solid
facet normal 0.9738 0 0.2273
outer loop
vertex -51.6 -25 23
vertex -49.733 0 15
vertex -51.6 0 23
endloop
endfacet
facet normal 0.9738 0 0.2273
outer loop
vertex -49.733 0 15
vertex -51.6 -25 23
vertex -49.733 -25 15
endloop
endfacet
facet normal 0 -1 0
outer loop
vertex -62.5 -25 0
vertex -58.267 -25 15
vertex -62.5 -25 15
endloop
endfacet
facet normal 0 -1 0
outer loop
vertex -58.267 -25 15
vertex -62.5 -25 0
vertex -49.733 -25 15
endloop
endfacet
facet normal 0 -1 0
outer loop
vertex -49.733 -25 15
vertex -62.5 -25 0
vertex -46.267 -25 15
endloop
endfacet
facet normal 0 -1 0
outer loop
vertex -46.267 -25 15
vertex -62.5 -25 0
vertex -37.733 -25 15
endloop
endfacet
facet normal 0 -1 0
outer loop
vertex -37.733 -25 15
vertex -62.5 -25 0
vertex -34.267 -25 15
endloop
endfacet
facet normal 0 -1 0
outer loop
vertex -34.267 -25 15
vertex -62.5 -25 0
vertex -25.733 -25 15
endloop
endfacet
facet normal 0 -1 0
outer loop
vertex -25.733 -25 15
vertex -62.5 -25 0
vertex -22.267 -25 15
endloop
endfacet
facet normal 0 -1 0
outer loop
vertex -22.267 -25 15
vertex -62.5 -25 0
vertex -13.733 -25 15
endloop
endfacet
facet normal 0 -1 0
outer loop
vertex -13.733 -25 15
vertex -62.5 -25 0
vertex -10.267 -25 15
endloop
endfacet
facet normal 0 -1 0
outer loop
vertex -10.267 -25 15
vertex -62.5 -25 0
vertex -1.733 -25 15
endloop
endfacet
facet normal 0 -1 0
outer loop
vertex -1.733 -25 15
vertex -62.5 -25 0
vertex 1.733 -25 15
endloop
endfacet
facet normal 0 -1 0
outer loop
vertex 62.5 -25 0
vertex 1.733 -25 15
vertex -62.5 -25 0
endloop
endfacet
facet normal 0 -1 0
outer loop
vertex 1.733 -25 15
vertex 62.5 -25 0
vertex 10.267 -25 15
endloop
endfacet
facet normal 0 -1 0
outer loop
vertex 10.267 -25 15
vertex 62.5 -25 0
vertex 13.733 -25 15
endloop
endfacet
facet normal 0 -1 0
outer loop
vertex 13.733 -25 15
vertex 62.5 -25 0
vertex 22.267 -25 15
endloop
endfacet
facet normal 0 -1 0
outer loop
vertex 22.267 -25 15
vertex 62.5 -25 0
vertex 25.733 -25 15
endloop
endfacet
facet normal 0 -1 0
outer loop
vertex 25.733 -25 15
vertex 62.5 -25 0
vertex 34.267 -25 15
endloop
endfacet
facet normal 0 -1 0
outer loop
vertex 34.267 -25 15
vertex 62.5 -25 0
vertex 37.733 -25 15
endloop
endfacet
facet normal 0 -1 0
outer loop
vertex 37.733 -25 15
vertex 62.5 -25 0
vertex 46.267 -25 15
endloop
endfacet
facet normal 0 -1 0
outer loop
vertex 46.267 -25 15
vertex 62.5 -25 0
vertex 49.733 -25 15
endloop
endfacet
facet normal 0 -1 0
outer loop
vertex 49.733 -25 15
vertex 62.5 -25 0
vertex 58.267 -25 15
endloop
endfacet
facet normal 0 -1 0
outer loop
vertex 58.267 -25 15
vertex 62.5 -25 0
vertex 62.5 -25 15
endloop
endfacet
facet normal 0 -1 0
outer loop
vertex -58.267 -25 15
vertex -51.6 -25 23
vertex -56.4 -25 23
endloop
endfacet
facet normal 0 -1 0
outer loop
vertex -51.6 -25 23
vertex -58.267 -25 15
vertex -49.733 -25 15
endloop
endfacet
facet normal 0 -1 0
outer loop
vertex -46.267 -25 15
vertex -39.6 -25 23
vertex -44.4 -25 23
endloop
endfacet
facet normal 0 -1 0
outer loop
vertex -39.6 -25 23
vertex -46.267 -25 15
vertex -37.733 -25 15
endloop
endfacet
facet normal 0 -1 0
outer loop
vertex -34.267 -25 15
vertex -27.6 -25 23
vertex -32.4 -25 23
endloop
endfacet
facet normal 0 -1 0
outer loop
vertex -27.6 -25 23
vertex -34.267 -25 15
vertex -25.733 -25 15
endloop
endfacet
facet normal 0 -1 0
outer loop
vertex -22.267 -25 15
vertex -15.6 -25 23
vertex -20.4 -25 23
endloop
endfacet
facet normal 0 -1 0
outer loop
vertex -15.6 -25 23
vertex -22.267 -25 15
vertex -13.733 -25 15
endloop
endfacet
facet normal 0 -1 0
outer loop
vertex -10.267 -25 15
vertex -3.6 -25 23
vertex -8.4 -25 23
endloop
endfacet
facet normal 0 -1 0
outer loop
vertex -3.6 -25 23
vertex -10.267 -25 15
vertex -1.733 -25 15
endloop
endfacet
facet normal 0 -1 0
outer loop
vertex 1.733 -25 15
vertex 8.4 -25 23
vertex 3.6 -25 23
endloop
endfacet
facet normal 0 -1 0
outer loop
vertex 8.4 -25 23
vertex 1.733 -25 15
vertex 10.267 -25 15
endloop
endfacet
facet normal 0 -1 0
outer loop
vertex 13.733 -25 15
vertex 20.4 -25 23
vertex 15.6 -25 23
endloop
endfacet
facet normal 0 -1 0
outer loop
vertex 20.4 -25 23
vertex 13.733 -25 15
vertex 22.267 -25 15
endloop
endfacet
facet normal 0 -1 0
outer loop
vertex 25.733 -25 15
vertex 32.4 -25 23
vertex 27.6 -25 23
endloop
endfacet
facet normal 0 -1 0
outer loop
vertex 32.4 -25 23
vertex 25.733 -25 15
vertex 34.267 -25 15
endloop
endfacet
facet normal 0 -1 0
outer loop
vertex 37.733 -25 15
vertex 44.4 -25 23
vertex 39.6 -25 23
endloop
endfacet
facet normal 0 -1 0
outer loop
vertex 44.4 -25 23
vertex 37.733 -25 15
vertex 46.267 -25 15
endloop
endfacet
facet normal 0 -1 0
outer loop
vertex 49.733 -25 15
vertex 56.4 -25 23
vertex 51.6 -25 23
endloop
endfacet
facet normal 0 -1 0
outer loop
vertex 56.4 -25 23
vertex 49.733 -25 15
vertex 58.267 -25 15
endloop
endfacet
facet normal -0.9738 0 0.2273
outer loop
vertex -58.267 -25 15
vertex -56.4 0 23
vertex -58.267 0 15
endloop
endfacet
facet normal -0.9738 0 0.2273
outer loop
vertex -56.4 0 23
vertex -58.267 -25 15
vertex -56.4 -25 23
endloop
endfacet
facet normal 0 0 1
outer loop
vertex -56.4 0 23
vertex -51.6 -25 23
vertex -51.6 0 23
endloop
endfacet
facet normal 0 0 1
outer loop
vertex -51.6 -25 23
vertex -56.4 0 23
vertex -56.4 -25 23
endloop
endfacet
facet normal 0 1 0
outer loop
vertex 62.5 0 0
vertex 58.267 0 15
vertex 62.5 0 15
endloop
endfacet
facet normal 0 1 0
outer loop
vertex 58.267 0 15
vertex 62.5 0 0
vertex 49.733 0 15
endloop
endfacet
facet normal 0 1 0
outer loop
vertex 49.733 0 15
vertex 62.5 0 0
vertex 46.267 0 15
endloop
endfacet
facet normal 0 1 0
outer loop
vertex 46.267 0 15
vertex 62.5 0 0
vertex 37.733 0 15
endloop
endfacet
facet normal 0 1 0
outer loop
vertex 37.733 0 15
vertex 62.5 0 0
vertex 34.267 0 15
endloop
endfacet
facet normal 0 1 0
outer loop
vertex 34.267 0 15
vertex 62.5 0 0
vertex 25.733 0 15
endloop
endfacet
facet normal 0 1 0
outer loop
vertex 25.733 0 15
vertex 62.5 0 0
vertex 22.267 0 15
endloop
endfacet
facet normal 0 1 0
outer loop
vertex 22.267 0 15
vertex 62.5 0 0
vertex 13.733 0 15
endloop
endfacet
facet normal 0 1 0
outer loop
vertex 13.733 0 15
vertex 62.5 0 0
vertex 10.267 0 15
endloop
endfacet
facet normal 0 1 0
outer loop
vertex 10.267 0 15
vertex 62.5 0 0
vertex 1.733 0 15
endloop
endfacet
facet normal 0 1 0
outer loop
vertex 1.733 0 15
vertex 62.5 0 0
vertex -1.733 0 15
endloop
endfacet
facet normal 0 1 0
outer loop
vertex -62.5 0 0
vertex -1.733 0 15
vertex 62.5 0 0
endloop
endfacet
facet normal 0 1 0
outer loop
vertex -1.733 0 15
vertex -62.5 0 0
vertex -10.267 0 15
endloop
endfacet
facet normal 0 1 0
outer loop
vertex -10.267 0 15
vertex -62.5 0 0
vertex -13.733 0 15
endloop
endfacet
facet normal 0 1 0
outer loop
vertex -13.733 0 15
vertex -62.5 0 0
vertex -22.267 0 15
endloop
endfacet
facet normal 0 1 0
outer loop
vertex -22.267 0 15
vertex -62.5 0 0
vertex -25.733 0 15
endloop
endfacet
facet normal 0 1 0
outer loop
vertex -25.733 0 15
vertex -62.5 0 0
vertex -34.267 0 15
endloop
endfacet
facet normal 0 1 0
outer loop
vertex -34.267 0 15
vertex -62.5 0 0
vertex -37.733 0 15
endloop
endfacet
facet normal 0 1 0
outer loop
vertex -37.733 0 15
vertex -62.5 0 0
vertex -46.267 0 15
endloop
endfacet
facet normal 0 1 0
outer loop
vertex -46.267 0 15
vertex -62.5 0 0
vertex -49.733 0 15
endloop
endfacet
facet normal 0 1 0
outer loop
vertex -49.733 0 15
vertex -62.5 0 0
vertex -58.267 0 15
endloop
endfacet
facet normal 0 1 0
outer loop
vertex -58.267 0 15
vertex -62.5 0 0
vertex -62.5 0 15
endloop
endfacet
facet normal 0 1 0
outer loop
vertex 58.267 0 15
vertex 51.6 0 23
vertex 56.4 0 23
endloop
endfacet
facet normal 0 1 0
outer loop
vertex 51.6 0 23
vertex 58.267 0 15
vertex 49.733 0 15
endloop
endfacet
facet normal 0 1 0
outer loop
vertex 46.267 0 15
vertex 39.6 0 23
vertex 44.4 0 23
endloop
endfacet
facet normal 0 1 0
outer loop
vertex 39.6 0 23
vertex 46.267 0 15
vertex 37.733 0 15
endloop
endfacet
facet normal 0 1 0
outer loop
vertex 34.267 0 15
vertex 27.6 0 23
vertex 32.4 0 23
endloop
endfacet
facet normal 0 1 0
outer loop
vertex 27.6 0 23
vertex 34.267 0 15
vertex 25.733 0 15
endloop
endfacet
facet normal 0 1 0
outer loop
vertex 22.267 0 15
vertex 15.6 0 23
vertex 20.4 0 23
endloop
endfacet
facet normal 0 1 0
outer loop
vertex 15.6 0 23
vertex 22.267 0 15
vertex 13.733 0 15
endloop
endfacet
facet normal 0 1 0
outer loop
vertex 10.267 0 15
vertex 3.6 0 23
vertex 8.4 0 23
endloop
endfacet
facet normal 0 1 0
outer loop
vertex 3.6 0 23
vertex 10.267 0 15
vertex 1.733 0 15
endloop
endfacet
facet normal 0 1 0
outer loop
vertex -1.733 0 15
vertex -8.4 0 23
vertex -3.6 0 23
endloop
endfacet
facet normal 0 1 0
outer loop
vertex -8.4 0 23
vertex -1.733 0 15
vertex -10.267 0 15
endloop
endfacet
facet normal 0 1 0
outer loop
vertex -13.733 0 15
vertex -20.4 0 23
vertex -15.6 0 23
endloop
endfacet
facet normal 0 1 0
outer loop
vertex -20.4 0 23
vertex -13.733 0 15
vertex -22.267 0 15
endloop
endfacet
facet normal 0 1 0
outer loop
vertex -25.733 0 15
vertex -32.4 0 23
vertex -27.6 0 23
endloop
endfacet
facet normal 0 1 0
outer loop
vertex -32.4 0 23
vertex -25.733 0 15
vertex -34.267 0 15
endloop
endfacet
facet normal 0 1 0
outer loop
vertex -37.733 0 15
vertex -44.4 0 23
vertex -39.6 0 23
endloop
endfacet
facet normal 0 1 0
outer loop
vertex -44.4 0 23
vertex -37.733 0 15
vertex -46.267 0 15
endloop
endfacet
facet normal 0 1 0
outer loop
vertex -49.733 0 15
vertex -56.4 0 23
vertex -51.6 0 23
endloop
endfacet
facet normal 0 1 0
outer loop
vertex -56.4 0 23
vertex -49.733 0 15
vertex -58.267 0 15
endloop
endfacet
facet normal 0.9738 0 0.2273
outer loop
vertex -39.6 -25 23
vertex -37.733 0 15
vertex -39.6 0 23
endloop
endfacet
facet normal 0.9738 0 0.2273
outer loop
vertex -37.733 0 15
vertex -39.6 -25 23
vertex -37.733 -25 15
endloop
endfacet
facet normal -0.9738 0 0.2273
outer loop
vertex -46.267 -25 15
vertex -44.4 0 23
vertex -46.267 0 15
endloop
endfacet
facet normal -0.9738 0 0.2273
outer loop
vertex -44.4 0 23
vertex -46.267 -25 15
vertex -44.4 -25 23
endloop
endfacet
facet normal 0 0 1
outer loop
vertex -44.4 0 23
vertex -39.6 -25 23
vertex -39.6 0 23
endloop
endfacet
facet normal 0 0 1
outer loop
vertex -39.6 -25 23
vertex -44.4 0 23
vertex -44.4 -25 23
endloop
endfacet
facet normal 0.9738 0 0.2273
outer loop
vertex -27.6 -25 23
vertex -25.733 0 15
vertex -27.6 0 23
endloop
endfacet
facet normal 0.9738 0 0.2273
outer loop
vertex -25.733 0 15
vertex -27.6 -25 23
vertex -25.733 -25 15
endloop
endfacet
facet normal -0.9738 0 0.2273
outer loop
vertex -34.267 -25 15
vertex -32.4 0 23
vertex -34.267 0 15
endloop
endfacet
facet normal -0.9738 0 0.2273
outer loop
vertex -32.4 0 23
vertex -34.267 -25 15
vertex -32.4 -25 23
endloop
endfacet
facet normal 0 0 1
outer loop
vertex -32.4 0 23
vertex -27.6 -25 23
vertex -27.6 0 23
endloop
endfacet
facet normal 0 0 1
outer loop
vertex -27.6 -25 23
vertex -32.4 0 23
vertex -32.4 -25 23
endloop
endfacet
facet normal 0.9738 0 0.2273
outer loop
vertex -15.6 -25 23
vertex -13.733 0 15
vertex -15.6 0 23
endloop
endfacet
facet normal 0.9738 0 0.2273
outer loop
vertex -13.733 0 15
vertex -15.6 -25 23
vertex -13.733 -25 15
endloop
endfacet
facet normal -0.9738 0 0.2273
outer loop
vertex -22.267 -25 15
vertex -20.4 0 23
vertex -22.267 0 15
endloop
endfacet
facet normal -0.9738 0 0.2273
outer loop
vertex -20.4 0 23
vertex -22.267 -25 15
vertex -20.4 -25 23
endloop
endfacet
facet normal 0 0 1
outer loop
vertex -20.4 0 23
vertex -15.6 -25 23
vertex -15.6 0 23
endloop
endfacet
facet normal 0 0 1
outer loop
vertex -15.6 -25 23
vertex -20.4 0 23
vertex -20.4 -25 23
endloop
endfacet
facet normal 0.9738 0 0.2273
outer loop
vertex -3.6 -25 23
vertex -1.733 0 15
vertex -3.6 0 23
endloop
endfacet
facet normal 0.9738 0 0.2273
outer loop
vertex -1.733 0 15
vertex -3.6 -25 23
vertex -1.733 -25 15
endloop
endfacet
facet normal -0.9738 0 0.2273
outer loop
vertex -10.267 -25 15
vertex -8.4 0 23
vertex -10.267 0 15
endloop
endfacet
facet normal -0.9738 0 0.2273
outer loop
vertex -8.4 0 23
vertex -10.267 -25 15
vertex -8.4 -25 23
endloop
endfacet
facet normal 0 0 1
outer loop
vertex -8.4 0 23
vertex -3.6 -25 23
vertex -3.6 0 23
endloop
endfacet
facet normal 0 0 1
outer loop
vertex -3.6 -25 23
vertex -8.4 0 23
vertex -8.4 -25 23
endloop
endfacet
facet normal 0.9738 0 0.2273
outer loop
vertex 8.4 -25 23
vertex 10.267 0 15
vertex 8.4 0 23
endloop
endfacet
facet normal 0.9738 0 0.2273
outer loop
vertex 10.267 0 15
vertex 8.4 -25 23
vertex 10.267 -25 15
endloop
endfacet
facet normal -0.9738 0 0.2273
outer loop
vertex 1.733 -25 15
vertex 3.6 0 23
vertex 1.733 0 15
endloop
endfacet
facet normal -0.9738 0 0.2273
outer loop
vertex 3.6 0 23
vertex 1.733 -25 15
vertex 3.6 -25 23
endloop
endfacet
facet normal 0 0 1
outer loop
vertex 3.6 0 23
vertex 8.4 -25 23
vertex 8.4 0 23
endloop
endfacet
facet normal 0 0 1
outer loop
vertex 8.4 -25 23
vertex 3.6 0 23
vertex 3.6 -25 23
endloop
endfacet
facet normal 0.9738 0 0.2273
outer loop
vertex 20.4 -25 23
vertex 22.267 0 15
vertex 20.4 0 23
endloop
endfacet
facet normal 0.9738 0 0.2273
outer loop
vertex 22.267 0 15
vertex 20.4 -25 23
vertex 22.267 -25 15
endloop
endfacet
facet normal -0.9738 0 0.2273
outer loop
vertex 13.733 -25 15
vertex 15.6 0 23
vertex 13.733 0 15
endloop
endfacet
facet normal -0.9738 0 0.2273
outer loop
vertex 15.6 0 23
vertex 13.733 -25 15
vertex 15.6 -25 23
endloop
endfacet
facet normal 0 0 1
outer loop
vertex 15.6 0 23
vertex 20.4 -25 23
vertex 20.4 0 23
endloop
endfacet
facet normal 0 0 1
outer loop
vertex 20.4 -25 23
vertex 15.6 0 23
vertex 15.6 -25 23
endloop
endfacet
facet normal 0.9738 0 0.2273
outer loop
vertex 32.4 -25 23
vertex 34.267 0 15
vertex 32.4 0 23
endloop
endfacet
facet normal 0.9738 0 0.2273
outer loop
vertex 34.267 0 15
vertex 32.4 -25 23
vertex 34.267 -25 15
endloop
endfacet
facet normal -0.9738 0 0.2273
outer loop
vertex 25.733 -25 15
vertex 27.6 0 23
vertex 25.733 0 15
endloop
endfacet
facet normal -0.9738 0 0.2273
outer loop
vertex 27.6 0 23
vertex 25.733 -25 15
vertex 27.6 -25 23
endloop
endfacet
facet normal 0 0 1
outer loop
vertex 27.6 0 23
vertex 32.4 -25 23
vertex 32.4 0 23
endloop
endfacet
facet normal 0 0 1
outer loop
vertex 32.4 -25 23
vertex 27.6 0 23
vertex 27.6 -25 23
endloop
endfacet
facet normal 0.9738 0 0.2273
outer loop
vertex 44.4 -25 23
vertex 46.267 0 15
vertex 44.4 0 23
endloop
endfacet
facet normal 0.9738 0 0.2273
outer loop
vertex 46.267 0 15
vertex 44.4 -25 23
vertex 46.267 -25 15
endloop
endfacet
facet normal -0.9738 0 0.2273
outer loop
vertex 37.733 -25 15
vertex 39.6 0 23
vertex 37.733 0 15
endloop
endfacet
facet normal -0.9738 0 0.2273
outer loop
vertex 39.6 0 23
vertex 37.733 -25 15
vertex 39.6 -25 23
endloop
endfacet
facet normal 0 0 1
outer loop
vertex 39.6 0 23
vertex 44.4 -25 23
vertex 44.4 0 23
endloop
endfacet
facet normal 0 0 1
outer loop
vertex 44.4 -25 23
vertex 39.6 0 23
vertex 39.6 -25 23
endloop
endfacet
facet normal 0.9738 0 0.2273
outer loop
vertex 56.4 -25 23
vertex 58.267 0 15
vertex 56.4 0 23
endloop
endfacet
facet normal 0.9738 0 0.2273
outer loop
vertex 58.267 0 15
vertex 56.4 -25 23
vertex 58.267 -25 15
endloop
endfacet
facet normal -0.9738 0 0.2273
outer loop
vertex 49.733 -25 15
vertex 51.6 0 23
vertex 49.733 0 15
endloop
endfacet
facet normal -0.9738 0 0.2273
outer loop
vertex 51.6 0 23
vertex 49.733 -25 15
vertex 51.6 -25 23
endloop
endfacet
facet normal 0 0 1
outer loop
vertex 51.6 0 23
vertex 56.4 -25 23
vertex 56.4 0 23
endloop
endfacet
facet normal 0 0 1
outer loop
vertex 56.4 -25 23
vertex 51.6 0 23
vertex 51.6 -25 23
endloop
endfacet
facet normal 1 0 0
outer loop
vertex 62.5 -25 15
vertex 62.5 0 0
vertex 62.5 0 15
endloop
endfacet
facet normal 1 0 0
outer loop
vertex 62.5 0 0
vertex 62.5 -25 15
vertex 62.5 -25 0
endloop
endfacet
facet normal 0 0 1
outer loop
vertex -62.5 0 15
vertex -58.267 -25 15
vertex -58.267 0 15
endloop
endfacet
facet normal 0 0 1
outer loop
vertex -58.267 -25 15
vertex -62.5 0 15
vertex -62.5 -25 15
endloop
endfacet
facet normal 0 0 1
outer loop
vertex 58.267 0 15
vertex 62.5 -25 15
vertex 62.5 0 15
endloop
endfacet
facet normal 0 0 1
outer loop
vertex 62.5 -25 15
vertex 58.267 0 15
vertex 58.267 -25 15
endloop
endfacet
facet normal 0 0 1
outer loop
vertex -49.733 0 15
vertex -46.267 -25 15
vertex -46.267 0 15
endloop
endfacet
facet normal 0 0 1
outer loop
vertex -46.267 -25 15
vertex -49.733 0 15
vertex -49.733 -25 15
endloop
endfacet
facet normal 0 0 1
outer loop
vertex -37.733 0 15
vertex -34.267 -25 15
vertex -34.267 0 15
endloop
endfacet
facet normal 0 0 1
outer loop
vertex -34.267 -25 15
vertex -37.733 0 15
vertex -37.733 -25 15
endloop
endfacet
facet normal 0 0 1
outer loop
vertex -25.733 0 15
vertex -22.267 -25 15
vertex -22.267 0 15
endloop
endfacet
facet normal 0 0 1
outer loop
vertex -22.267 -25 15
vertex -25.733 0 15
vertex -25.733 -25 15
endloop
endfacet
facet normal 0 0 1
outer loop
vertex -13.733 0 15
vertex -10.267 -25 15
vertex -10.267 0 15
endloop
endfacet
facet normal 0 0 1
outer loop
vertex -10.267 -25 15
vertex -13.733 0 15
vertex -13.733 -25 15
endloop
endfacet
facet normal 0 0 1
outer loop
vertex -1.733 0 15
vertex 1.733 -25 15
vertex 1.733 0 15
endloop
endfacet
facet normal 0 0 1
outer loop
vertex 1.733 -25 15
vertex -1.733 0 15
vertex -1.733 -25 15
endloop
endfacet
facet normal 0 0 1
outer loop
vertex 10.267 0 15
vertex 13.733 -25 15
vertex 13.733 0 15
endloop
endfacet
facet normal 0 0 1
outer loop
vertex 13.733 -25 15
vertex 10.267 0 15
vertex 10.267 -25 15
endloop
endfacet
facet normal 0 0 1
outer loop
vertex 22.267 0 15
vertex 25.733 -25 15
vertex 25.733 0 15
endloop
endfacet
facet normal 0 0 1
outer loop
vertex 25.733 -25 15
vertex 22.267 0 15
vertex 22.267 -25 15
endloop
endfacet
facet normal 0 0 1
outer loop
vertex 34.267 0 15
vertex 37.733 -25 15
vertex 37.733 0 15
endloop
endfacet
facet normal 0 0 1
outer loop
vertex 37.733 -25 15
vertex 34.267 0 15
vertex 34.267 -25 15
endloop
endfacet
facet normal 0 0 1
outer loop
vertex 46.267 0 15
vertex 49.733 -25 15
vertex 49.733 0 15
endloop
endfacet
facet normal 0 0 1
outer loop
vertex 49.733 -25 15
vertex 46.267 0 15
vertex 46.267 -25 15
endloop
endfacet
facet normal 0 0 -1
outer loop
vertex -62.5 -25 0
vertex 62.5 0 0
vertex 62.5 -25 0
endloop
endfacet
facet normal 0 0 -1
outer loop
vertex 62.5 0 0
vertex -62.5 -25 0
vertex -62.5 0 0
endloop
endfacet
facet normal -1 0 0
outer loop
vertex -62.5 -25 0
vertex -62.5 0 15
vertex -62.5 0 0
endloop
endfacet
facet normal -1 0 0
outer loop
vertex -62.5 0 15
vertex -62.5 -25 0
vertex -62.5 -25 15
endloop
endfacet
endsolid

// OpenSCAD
$fn = 32;

// ----------------------------------------------------------------------
// Toothed rack, 10 teeth
// 12 mm pitch, 8 mm teeth
// ----------------------------------------------------------------------

// --- parameters (mm) ---
bar_w = 25;     // bar width (Y)
bar_h = 15;     // bar height (Z)
teeth = 10;     // number of teeth
pitch = 12;     // tooth pitch
tooth_h = 8;    // tooth height above the bar
root_w = 9;     // tooth width at the root
crest_w = 4.8;  // tooth width at the crest

// --- derived feature positions (mm) ---
span = (teeth - 1) * pitch;  // = 108   distance between the outer teeth
bar_l = span + root_w + 8;   // = 125   bar length: teeth plus 4 mm at each end
tooth_x = -span / 2;         // = -54   X of the first tooth
height = bar_h + tooth_h;    // = 23   overall height
feature_centers = [
  [tooth_x + 0 * pitch, -bar_w / 2],
  [tooth_x + 1 * pitch, -bar_w / 2],
  [tooth_x + 2 * pitch, -bar_w / 2],
  [tooth_x + 3 * pitch, -bar_w / 2],
  [tooth_x + 4 * pitch, -bar_w / 2],
  [tooth_x + 5 * pitch, -bar_w / 2],
  [tooth_x + 6 * pitch, -bar_w / 2],
  [tooth_x + 7 * pitch, -bar_w / 2],
  [tooth_x + 8 * pitch, -bar_w / 2],
  [tooth_x + 9 * pitch, -bar_w / 2]
];   // tooth centre line, drives the tooth loop

// bar with a rack of teeth, one extruded trapezoium per centre
module rack_tooth() {
  linear_extrude(height = bar_w)
    polygon(points = [
      [0, 0],
      [root_w, 0],
      [root_w / 2 + crest_w / 2, tooth_h + 1],
      [root_w / 2 - crest_w / 2, tooth_h + 1]
    ]);
}

union() {
  translate([-bar_l / 2, -bar_w, 0]) cube([bar_l, bar_w, bar_h]);
  for (centre = feature_centers)
    translate([centre[0] - root_w / 2, 0, bar_h - 1]) rotate([90, 0, 0]) rack_tooth();
}
